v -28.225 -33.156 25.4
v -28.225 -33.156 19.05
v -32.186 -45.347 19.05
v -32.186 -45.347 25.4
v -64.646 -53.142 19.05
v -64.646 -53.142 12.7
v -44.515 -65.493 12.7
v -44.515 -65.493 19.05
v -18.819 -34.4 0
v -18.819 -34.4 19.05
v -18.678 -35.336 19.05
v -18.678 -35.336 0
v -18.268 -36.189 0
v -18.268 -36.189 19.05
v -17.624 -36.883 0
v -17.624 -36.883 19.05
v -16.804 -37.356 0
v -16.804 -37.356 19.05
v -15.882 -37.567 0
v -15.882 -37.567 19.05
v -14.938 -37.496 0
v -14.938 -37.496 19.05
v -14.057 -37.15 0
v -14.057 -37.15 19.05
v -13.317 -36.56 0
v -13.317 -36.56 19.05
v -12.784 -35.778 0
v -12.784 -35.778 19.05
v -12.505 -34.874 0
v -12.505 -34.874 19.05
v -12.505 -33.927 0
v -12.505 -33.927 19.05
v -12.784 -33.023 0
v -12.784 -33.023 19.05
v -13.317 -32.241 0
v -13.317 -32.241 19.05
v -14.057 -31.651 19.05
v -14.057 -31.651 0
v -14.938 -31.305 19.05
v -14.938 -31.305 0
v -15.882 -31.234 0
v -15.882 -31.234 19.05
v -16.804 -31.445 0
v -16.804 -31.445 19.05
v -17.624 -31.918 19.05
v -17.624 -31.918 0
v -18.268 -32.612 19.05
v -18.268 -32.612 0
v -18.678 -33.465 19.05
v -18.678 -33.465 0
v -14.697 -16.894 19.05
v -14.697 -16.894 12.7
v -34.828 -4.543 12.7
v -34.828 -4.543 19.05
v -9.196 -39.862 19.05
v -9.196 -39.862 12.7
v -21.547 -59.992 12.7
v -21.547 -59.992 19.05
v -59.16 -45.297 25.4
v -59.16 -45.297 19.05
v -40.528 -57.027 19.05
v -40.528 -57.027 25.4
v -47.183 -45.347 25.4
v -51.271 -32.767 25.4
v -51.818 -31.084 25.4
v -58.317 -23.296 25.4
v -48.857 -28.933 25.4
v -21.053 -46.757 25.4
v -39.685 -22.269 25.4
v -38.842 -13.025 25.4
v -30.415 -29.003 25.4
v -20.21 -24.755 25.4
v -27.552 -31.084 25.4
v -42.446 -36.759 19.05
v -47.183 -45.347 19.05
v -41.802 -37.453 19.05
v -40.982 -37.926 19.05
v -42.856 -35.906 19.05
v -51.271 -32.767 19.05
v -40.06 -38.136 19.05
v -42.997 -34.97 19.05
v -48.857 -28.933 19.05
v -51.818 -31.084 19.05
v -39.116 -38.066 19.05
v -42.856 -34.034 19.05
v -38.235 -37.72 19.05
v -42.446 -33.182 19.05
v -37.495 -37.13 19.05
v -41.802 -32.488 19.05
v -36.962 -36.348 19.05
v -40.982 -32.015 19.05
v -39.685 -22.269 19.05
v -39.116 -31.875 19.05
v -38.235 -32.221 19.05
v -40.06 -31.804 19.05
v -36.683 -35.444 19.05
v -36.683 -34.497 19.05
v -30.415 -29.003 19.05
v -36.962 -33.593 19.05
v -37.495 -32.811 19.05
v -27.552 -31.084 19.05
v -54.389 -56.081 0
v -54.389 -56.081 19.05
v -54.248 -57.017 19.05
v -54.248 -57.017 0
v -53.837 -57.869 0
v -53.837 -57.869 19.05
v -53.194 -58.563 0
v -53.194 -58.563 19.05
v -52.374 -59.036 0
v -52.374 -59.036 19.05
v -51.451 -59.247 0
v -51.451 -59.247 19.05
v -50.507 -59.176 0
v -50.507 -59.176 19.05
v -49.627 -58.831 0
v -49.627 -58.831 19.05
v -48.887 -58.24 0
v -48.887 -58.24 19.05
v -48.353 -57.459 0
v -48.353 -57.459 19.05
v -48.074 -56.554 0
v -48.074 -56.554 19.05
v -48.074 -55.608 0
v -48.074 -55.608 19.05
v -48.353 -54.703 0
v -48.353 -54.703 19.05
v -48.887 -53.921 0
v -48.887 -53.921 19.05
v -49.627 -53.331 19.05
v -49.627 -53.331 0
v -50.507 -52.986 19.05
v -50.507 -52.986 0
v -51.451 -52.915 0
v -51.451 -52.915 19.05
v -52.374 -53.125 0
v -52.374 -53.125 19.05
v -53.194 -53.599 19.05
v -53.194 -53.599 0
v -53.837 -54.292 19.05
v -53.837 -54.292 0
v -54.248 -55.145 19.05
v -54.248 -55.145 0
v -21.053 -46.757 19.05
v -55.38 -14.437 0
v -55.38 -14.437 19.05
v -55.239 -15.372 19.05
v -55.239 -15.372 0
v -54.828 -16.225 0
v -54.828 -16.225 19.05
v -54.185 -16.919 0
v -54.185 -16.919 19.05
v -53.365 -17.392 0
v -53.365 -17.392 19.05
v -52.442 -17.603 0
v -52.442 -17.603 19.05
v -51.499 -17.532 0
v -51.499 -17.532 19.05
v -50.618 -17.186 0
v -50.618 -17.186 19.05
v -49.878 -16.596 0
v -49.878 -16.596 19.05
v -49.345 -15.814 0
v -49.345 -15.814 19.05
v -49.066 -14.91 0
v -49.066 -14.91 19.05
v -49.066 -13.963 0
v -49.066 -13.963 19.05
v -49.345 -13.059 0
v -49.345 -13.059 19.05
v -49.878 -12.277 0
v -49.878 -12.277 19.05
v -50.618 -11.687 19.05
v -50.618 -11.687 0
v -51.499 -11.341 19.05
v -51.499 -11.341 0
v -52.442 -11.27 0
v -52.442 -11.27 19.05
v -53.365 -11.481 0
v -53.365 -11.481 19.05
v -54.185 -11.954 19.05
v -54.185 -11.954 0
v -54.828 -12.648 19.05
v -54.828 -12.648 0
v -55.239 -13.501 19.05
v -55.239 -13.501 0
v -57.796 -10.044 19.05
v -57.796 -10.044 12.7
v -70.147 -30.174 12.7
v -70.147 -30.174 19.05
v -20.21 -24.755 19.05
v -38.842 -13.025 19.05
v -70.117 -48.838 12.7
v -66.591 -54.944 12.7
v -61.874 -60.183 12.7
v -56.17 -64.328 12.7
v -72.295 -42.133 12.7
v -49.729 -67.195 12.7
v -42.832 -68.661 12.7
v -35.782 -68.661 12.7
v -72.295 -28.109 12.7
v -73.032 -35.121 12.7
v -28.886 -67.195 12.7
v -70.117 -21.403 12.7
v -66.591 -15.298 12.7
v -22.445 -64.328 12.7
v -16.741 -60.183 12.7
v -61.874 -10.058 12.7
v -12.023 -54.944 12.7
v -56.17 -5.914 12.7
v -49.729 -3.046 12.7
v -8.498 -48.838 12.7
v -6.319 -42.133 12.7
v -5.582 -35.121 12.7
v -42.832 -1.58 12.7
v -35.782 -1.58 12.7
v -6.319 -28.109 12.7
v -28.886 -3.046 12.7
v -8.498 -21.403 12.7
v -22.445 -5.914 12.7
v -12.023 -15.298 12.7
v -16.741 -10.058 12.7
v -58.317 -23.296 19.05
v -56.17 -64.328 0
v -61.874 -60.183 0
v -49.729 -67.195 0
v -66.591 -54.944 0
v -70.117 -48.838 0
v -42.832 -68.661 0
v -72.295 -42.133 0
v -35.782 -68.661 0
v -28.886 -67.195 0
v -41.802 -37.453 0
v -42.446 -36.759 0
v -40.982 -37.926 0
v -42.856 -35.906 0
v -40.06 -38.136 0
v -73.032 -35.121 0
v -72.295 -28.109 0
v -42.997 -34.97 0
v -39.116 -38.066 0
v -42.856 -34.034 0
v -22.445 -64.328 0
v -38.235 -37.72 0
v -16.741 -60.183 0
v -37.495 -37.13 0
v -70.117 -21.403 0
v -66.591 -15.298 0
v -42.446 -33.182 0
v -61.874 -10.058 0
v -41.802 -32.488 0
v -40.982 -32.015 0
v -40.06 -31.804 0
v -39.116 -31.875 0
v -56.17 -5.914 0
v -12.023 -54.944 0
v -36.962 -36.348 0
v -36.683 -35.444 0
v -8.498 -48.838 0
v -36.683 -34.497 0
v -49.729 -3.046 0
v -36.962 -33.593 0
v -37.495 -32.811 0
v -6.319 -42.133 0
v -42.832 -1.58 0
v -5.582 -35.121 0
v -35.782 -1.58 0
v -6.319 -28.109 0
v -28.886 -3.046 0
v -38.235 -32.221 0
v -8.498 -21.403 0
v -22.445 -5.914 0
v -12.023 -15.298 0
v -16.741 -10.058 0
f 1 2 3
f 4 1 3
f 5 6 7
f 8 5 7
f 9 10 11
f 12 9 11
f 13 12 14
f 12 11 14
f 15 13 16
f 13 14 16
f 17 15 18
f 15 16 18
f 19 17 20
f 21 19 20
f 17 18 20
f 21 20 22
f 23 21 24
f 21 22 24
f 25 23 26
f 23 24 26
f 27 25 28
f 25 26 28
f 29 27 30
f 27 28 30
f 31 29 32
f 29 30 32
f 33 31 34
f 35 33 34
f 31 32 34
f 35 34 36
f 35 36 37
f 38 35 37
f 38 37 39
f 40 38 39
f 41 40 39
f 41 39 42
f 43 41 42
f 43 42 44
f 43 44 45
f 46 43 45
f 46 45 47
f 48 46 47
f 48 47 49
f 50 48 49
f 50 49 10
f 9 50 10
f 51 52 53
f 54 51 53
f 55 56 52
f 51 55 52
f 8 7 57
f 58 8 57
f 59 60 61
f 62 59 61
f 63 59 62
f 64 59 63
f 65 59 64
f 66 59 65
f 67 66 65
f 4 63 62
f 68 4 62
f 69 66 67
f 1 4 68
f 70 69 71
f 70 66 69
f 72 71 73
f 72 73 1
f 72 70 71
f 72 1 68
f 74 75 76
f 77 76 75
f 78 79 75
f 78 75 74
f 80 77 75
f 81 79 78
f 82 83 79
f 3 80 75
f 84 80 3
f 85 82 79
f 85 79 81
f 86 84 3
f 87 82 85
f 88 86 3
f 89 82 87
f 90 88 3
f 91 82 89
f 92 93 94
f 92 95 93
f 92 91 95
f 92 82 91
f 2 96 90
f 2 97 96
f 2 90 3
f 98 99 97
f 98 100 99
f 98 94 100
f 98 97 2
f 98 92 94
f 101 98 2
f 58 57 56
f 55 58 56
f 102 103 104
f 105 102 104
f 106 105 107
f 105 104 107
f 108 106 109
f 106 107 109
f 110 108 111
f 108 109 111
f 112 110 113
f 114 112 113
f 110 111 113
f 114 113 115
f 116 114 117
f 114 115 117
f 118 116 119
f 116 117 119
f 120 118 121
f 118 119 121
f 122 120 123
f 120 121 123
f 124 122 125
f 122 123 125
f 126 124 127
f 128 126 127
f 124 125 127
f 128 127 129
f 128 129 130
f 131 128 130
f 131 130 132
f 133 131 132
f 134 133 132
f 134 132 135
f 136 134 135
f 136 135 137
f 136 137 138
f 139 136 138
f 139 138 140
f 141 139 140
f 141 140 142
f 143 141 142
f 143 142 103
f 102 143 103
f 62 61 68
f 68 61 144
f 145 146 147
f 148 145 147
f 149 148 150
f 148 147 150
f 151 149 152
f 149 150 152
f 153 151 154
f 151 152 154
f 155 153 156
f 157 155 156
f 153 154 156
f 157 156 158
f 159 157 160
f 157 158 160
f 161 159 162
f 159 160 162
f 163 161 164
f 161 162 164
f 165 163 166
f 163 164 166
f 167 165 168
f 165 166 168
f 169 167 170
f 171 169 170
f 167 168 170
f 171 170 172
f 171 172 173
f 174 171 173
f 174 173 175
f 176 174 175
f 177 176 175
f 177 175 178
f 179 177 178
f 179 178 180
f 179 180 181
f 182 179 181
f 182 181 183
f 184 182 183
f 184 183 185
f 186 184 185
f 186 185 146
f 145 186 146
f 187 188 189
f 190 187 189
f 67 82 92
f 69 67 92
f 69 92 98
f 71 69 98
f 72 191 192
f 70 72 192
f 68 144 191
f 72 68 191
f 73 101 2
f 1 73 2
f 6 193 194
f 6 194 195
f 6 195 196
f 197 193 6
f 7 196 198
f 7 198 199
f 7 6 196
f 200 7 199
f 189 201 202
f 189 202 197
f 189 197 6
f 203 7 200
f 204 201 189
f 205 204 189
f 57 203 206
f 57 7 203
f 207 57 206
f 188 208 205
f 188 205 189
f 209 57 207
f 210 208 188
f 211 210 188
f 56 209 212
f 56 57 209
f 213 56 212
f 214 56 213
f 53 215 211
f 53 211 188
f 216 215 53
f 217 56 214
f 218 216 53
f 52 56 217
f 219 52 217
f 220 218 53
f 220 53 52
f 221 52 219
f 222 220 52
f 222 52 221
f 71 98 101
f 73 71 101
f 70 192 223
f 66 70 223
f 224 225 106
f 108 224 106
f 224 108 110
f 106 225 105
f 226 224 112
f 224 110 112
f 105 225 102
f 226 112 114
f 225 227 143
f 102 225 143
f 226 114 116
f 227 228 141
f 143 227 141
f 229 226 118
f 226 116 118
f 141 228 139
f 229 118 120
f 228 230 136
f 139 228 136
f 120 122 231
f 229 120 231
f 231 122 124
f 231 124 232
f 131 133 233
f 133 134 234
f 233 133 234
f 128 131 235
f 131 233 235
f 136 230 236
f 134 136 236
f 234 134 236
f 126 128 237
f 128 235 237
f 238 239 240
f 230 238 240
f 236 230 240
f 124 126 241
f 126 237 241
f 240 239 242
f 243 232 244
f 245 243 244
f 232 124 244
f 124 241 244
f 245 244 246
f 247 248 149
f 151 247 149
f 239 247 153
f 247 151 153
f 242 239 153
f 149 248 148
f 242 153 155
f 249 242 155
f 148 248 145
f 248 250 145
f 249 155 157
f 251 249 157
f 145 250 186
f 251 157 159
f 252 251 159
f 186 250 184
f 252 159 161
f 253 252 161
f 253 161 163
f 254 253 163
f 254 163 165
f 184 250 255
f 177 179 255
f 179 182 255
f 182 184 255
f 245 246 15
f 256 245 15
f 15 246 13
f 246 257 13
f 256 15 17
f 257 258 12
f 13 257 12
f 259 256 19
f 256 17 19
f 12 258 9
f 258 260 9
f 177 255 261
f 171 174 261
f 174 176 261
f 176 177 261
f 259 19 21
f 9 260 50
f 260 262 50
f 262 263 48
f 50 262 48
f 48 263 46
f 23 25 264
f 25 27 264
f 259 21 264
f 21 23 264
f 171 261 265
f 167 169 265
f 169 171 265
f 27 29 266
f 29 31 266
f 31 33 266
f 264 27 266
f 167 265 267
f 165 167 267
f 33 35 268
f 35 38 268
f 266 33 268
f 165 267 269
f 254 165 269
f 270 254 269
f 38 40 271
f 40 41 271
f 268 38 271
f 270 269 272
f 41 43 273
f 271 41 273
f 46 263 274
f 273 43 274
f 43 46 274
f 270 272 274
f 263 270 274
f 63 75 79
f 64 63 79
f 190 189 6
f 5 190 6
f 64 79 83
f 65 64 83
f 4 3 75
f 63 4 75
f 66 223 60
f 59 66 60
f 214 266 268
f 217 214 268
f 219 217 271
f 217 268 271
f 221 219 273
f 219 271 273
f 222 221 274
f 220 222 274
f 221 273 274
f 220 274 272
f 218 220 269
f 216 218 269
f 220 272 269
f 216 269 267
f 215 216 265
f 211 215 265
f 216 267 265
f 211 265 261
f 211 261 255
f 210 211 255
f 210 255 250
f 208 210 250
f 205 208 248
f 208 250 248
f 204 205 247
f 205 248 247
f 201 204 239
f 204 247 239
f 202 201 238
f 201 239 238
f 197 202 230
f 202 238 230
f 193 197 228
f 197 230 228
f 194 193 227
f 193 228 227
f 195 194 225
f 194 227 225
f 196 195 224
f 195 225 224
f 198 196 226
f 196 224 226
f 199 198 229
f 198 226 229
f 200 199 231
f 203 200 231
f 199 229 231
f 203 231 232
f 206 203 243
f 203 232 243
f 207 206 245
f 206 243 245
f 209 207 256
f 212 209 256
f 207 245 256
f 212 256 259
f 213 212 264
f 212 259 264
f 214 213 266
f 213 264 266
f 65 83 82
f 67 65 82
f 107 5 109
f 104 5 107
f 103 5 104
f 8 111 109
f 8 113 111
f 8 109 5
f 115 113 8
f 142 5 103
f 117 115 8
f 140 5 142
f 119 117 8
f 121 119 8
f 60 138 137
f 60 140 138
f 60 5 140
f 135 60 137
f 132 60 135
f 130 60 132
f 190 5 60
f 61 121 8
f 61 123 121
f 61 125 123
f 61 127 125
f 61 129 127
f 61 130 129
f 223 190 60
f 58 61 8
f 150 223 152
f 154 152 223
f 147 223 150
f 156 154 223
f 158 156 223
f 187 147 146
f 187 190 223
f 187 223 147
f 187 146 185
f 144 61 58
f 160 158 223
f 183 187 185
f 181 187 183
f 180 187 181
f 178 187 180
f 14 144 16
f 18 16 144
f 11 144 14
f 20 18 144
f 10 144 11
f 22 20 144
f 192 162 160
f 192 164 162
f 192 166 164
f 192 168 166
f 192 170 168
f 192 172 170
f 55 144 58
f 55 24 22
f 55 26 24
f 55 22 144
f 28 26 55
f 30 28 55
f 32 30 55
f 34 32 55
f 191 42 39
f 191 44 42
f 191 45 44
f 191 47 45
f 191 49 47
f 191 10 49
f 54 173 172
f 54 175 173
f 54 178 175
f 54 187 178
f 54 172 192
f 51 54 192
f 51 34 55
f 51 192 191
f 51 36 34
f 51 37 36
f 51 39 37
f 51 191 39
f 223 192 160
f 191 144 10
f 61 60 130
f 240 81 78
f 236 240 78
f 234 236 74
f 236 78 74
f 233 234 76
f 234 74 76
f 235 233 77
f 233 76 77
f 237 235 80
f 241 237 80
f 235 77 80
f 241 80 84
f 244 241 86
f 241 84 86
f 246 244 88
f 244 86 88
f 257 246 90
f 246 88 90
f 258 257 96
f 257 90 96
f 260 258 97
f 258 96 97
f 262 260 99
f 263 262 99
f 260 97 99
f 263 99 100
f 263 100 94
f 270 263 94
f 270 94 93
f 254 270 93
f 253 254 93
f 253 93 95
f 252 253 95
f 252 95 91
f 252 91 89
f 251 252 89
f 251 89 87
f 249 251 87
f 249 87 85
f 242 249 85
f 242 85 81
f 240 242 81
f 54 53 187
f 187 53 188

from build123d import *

# Parameters (mm, degrees)
F0_R       = 33.7251473282
F5_DEPTH   = 12.7
F6_DEPTH   = 25.4
F7_DEPTH   = 19.05
F8_D       = 6.35
F8_ON_F4_D = 6.35


with BuildPart() as f5:
    # F0 (on Top) → F5 (new body)
    with BuildSketch(Plane.XY):
        with Locations((-39.3072403967, -35.1206697524)):
            Circle(F0_R)
    extrude(amount=F5_DEPTH)

    # F1 (on face) → F6 (join)
    with BuildSketch(Plane.XY):
        Polygon((-20.2098016627, -24.7553280585), (-38.8420633972, -13.0248842761), (-30.4153332648, -29.0032569477), (-27.5516730192, -31.0838279019), (-28.2250702608, -33.1563315064), (-21.0525331088, -46.7565619417), align=None)
        Polygon((-30.4153332648, -29.0032569477), (-38.8420633972, -13.0248842761), (-48.8573559288, -28.9328546186), (-39.6847948432, -22.2685988992), align=None)
        Polygon((-48.8573559288, -28.9328546186), (-38.8420633972, -13.0248842761), (-58.3170565776, -23.2956743769), (-59.1597880237, -45.2969082601), (-51.2710974395, -32.7667644367), (-51.8179166672, -31.0838279019), align=None)
        Polygon((-21.0525331088, -46.7565619417), (-28.2250702608, -33.1563315064), (-32.1861131663, -45.3471680467), (-47.1834765201, -45.3471680467), (-51.2710974395, -32.7667644367), (-59.1597880237, -45.2969082601), align=None)
        Polygon((-40.5275262892, -57.0273520425), (-21.0525331088, -46.7565619417), (-59.1597880237, -45.2969082601), align=None)
    extrude(amount=F6_DEPTH)

    # F2 (on Top) → F7 (join)
    with BuildSketch(Plane.XY):
        Polygon((-14.6972839647, -16.8937072017), (-34.8278614766, -4.542624592), (-57.7958636127, -10.0435581916), (-70.1469462224, -30.1741357035), (-64.6460126228, -53.1421378396), (-44.5154351109, -65.4932204493), (-21.5474329747, -59.9922868497), (-9.1963503651, -39.8617093378), align=None)
    extrude(amount=F7_DEPTH)

    # F8 (through all)
    with Locations(Plane(origin=(0, 0, 0), x_dir=(1, 0, 0), z_dir=(0, 0, -1))):
        with Locations((-39.8223698139, 34.9703021348)):
            Hole(F8_D / 2)

    # F8 on F4 (through all)
    with Locations(Plane(origin=(0, 0, 0), x_dir=(1, 0, 0), z_dir=(0, 0, -1))):
        with Locations((-52.2050820291, 14.4365634769), (-51.214001947, 56.08092756), (-15.6444647677, 34.4004449901)):
            Hole(F8_ON_F4_D / 2)


solid = f5.part
